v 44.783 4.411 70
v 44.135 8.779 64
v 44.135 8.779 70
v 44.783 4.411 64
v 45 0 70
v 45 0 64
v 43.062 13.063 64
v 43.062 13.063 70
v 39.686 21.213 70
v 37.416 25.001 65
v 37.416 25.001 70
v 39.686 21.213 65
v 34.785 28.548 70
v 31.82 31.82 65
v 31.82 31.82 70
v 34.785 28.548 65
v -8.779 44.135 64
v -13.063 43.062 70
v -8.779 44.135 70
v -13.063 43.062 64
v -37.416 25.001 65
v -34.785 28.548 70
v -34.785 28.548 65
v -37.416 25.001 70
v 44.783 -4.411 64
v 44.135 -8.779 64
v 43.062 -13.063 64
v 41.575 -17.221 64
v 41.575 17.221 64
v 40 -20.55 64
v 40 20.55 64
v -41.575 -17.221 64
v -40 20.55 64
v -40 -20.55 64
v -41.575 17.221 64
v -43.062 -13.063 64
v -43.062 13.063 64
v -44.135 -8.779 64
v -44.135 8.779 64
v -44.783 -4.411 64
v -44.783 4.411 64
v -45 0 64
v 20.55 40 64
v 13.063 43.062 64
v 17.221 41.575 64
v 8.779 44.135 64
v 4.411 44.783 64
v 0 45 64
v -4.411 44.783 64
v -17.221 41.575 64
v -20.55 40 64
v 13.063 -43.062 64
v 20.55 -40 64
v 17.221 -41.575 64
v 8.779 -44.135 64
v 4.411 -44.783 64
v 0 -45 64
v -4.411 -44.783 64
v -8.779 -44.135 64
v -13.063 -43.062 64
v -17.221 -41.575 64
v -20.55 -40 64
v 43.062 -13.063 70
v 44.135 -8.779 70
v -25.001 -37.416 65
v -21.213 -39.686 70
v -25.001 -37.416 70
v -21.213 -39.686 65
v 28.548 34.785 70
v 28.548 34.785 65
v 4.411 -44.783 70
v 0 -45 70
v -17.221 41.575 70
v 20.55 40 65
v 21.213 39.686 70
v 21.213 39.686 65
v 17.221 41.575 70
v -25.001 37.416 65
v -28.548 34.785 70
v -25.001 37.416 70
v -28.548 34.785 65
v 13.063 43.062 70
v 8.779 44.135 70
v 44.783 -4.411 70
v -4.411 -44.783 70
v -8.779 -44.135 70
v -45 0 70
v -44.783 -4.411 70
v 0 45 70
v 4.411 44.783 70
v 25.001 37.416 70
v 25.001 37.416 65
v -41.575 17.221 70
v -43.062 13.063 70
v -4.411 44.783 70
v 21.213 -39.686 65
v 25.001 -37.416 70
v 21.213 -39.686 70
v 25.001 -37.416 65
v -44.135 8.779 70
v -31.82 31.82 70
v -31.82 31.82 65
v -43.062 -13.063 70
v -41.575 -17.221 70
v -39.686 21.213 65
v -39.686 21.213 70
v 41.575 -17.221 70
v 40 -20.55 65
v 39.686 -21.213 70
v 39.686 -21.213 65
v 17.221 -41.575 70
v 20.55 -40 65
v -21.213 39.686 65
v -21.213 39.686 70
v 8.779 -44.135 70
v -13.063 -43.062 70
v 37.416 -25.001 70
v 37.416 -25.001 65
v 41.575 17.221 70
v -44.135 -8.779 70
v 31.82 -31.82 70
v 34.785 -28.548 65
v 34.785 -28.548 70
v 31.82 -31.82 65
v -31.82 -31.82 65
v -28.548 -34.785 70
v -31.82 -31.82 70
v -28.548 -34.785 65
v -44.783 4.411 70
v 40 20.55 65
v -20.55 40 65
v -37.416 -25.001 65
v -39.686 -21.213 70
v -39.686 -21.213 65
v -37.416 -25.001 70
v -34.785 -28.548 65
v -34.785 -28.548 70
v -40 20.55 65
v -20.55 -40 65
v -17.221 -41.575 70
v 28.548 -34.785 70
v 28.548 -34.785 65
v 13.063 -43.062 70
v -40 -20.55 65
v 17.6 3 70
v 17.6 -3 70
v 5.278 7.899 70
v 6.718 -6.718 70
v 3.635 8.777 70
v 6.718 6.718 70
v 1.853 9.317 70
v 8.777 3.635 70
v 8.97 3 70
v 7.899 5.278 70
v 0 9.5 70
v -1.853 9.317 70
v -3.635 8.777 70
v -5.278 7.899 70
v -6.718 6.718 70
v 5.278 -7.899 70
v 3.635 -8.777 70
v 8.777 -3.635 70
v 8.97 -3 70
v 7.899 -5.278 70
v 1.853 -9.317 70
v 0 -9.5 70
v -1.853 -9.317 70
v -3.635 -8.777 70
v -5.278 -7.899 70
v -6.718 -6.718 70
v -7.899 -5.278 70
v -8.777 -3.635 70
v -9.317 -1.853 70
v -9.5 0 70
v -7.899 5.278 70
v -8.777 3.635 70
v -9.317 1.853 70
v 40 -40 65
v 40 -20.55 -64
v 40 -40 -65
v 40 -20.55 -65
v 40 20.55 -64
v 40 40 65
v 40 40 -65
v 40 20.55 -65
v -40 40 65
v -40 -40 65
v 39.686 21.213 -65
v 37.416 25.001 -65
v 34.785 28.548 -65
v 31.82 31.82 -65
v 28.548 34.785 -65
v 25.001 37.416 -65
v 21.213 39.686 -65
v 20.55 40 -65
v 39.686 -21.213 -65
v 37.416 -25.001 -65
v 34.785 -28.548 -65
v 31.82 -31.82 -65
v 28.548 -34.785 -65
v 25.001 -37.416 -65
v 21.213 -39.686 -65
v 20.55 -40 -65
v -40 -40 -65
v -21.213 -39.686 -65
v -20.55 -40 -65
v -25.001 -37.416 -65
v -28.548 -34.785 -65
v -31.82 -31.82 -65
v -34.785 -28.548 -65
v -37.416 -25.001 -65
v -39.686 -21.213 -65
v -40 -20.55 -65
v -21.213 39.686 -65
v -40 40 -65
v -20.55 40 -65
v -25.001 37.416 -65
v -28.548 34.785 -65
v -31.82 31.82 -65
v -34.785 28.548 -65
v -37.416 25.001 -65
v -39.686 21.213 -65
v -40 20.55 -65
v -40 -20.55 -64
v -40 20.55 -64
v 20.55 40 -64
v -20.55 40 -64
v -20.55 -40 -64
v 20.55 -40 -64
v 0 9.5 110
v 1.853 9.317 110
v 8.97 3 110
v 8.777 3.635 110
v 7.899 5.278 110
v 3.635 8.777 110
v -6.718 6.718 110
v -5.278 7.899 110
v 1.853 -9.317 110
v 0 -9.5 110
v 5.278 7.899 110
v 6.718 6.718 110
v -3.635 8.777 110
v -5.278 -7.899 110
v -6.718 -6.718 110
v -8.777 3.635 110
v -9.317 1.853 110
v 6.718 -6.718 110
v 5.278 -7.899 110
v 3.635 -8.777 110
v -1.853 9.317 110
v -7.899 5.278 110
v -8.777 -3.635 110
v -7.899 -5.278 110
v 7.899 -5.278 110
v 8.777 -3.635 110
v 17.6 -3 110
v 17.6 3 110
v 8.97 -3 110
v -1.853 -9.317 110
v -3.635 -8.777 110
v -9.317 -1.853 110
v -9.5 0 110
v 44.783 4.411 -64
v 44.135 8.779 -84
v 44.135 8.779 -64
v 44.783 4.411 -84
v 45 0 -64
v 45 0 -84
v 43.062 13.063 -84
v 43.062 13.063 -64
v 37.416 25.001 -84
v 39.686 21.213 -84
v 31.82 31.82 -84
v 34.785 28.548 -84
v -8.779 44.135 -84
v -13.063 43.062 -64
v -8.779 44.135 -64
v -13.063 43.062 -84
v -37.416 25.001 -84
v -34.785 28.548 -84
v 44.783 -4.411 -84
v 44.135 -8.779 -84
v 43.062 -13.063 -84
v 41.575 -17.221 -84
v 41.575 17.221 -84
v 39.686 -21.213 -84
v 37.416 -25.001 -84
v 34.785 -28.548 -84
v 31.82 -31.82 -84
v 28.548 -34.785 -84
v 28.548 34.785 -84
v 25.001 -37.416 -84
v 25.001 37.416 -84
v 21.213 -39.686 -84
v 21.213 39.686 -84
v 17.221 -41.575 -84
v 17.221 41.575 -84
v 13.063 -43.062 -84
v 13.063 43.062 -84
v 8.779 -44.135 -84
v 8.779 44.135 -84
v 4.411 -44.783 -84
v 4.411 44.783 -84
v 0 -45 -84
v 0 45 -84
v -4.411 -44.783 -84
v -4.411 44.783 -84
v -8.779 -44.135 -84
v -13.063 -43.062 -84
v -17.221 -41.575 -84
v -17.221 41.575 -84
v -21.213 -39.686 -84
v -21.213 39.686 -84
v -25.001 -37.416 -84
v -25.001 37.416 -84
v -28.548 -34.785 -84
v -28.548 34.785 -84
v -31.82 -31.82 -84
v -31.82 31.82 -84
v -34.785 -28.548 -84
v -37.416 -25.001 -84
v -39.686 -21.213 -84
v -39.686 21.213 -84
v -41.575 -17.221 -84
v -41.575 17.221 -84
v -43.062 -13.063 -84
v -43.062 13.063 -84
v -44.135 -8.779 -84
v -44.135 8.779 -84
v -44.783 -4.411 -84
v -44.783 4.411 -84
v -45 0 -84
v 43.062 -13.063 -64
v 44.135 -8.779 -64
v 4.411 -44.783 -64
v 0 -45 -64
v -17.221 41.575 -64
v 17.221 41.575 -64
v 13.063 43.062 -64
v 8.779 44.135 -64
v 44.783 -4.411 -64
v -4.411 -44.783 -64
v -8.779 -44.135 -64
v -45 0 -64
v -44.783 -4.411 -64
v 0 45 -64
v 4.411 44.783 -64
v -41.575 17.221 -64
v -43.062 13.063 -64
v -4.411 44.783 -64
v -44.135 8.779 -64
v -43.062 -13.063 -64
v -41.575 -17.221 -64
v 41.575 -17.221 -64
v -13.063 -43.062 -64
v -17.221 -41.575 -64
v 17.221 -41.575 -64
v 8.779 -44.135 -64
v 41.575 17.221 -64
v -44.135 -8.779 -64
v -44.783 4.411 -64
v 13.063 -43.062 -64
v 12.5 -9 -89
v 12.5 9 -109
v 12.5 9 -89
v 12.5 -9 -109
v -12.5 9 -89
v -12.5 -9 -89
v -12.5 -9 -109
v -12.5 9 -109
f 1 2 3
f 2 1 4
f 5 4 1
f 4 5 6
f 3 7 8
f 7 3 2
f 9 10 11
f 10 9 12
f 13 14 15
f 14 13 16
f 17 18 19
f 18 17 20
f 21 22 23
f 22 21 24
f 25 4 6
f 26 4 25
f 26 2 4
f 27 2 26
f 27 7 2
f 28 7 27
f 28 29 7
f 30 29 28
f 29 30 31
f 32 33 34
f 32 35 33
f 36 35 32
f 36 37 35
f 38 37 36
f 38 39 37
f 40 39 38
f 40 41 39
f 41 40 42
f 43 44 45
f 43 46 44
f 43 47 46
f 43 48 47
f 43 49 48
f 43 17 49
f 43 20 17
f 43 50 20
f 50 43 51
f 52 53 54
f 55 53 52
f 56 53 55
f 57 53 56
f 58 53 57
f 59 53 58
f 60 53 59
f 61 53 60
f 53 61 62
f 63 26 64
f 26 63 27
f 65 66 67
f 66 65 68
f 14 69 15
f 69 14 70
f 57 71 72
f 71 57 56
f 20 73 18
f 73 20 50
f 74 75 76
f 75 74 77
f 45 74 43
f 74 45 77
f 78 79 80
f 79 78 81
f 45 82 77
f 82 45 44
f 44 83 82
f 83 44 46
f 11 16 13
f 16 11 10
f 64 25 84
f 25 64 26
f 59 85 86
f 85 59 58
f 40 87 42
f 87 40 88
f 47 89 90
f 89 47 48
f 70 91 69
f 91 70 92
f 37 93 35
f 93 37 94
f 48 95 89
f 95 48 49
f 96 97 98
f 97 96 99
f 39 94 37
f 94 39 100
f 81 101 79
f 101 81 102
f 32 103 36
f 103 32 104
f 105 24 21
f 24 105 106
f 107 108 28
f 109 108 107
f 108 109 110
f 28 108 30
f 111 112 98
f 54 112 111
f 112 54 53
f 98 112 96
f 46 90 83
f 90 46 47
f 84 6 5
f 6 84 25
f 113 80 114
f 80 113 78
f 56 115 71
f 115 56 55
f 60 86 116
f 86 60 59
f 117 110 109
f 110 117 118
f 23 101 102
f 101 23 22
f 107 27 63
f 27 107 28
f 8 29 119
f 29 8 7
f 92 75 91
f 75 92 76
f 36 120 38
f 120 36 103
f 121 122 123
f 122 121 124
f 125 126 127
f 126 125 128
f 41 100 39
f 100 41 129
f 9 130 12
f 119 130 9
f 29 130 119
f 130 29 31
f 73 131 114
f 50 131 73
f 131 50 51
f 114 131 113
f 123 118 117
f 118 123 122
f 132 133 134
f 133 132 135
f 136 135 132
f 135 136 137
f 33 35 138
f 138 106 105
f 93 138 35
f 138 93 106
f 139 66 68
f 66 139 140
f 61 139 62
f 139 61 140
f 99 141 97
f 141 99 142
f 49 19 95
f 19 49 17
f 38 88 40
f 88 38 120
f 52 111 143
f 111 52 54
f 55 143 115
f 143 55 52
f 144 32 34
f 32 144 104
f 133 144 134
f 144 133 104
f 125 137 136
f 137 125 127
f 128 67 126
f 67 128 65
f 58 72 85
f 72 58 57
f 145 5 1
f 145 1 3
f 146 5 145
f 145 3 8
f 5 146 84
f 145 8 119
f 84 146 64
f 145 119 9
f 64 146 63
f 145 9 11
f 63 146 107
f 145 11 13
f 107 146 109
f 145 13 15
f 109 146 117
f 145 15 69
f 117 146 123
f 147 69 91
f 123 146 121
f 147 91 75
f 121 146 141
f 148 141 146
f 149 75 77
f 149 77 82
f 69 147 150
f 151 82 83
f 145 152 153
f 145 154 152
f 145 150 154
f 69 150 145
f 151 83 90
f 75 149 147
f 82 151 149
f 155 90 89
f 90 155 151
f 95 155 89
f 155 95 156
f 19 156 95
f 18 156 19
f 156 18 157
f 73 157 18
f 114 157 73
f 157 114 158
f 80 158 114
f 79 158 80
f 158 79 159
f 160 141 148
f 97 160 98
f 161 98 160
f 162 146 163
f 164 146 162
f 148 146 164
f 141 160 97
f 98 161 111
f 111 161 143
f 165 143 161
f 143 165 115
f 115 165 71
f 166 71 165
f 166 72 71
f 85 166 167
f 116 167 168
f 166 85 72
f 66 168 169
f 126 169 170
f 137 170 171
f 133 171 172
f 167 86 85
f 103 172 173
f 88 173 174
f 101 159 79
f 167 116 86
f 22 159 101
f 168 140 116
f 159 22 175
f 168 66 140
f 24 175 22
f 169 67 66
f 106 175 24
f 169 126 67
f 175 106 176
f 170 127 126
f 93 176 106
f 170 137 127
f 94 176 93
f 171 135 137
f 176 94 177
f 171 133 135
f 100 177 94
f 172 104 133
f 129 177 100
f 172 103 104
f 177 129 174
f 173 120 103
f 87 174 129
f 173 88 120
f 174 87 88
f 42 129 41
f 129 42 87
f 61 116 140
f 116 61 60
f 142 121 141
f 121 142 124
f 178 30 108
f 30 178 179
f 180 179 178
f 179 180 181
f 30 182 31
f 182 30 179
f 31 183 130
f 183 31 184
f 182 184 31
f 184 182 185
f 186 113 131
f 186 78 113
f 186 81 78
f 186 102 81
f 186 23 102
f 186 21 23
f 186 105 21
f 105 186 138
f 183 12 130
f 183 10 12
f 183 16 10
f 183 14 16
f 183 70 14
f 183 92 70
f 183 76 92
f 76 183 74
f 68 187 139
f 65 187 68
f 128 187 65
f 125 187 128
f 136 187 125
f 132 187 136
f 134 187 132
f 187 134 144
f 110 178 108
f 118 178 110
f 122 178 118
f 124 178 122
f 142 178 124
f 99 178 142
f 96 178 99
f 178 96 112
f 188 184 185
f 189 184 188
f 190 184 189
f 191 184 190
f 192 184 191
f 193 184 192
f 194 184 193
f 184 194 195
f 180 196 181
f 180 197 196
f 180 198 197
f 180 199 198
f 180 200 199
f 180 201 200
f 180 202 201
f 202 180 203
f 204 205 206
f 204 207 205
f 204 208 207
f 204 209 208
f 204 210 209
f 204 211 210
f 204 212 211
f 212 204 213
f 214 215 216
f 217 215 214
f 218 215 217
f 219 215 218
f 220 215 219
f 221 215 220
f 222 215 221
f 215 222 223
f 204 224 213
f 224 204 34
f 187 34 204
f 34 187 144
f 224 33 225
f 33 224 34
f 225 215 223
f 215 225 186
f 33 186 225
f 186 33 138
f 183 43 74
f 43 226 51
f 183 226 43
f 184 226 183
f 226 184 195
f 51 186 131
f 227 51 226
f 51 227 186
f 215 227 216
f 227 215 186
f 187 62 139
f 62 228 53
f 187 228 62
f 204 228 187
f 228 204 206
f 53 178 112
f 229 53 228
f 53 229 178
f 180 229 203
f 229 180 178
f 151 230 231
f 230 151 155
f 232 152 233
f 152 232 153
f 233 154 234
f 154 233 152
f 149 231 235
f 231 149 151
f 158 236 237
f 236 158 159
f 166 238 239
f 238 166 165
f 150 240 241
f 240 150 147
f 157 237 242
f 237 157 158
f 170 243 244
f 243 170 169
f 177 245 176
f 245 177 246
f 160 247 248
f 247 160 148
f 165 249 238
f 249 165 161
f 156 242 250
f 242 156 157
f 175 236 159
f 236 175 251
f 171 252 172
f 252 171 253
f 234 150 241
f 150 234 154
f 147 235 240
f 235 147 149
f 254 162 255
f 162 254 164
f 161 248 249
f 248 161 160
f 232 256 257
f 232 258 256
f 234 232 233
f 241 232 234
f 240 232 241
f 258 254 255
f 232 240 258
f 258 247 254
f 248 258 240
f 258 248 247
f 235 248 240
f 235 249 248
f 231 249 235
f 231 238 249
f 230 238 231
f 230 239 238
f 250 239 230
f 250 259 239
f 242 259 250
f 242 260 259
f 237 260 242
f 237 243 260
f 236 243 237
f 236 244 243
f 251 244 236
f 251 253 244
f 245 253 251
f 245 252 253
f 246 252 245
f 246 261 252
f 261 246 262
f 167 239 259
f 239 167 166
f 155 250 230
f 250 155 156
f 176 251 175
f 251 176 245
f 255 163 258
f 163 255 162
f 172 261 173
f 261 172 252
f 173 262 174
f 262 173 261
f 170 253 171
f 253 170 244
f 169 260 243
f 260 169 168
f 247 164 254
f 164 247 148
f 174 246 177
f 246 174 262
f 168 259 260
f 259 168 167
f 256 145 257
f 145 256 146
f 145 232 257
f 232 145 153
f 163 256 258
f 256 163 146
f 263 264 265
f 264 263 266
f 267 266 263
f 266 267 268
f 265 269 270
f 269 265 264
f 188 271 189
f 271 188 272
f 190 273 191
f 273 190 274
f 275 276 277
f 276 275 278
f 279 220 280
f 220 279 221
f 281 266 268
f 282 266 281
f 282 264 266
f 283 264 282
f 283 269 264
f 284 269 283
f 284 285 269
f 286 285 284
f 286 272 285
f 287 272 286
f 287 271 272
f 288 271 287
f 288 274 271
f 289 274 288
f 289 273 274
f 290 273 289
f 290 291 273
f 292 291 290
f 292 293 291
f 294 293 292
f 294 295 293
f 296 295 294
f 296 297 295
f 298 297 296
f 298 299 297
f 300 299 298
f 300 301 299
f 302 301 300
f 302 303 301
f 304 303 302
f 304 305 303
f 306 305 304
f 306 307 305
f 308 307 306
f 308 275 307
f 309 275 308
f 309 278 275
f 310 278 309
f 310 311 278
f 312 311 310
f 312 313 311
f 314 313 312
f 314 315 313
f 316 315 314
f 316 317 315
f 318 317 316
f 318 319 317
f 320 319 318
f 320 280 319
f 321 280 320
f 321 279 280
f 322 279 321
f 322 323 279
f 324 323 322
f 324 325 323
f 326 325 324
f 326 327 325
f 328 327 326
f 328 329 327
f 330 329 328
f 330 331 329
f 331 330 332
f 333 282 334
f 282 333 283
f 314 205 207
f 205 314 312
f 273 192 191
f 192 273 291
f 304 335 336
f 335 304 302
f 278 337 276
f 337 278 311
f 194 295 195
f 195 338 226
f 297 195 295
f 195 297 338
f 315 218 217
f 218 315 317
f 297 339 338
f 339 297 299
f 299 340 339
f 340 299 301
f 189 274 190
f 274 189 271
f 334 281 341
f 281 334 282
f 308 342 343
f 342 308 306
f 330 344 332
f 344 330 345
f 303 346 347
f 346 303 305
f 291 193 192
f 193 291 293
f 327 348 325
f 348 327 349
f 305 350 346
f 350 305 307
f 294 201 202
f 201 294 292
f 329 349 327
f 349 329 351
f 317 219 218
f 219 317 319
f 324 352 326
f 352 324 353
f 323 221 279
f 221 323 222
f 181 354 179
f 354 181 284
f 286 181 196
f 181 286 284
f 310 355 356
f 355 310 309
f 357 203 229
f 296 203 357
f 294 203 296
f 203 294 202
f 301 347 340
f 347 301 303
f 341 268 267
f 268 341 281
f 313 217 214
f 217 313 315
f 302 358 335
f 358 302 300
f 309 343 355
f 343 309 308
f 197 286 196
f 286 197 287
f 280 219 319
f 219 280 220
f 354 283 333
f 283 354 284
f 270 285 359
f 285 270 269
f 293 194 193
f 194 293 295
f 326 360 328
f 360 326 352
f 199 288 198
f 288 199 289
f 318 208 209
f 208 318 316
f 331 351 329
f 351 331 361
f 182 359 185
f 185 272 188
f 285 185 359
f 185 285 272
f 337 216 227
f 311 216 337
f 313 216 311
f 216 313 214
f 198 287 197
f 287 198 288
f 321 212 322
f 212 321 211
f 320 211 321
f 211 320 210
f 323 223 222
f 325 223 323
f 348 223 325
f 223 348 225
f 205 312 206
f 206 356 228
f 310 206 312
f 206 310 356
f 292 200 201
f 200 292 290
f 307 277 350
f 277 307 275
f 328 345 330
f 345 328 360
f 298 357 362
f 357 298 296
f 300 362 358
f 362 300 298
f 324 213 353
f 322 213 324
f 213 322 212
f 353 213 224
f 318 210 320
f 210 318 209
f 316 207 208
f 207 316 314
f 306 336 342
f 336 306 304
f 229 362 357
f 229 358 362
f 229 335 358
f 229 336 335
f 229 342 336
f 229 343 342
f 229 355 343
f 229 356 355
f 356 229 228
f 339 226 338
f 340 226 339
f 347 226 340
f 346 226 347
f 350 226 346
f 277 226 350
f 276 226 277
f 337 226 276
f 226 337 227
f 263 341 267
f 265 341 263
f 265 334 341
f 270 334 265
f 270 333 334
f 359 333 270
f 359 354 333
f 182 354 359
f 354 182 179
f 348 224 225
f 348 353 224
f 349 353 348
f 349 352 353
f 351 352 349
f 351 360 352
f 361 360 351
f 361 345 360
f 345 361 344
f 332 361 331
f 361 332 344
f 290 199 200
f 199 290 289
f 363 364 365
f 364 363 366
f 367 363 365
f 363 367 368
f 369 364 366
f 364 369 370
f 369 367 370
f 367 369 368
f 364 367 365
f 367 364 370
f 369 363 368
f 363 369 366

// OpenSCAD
// Parameters
body_width_mm = 80; //[40:160:1]
body_height_mm = 80; //[40:160:1]
body_length_mm = 130; //[65:260:1]
flange_diameter_mm = 90; //[45:180:1]
flange_thickness_mm = 6; //[3:12:1]
mount_hole_count = 4; //[4:4:1]
mount_hole_diameter_mm = 6.5; //[3.25:13:0.1]
mount_hole_square_pitch_mm = 70; //[35:140:1]
shaft_diameter_mm = 19; //[9.5:38:0.5]
shaft_length_mm = 40; //[20:80:1]
shaft_key_width_mm = 6; //[3:12:0.5]
shaft_key_depth_mm = 2.8; //[1.4:5.6:0.1]
rear_cap_length_mm = 20; //[10:40:1]
encoder_bulge_diameter_mm = 70; //[35:140:1]
encoder_bulge_length_mm = 25; //[12.5:50:1]
connector_width_mm = 25; //[12.5:50:1]
connector_height_mm = 18; //[9:36:1]
connector_depth_mm = 20; //[10:40:1]
overlap_mm = 1; //[0.5:2:0.1]
hole_extra_mm = 2; //[1:6:0.5]

// Servo Motor - complete geometry
module servo_motor() {
  color([0.15, 0.2, 0.35]) {
    // Motor Housing
    translate([0, 0, 0])
      cube([body_width_mm, body_height_mm, body_length_mm], center=true);

    // Front Mounting Flange with Holes
    difference() {
      translate([0, 0, body_length_mm/2 + flange_thickness_mm/2 - overlap_mm])
        cylinder(r=flange_diameter_mm/2, h=flange_thickness_mm, center=true, $fn=64);
      for (x = [-1, 1], y = [-1, 1]) {
        translate([x * mount_hole_square_pitch_mm/2, y * mount_hole_square_pitch_mm/2, body_length_mm/2 + flange_thickness_mm/2 - overlap_mm])
          cylinder(r=mount_hole_diameter_mm/2, h=flange_thickness_mm + hole_extra_mm, center=true, $fn=32);
      }
    }

    // Output Shaft
    color("Silver")
    translate([0, 0, body_length_mm/2 + flange_thickness_mm - overlap_mm + shaft_length_mm/2])
      cylinder(r=shaft_diameter_mm/2, h=shaft_length_mm, center=true, $fn=32);

    // Shaft Key or Flat
    translate([shaft_diameter_mm/2 - shaft_key_depth_mm/2, 0, body_length_mm/2 + flange_thickness_mm - overlap_mm + shaft_length_mm/2])
      cube([shaft_diameter_mm, shaft_key_width_mm, shaft_length_mm], center=true);

    // Rear Endcap
    translate([0, 0, -body_length_mm/2 - rear_cap_length_mm/2 + overlap_mm])
      cylinder(r=flange_diameter_mm/2, h=rear_cap_length_mm, center=true, $fn=64);

    // Encoder or Brake Bulge
    translate([0, 0, -body_length_mm/2 - rear_cap_length_mm + overlap_mm + encoder_bulge_length_mm/2])
      cylinder(r=encoder_bulge_diameter_mm/2, h=encoder_bulge_length_mm, center=true, $fn=64);

    // Cable Connector Block
    translate([0, 0, -body_length_mm/2 - rear_cap_length_mm - encoder_bulge_length_mm + overlap_mm + connector_depth_mm/2])
      cube([connector_width_mm, connector_height_mm, connector_depth_mm], center=true);
  }
}

// Assembly
module assembly() {
  servo_motor();
}

assembly();
